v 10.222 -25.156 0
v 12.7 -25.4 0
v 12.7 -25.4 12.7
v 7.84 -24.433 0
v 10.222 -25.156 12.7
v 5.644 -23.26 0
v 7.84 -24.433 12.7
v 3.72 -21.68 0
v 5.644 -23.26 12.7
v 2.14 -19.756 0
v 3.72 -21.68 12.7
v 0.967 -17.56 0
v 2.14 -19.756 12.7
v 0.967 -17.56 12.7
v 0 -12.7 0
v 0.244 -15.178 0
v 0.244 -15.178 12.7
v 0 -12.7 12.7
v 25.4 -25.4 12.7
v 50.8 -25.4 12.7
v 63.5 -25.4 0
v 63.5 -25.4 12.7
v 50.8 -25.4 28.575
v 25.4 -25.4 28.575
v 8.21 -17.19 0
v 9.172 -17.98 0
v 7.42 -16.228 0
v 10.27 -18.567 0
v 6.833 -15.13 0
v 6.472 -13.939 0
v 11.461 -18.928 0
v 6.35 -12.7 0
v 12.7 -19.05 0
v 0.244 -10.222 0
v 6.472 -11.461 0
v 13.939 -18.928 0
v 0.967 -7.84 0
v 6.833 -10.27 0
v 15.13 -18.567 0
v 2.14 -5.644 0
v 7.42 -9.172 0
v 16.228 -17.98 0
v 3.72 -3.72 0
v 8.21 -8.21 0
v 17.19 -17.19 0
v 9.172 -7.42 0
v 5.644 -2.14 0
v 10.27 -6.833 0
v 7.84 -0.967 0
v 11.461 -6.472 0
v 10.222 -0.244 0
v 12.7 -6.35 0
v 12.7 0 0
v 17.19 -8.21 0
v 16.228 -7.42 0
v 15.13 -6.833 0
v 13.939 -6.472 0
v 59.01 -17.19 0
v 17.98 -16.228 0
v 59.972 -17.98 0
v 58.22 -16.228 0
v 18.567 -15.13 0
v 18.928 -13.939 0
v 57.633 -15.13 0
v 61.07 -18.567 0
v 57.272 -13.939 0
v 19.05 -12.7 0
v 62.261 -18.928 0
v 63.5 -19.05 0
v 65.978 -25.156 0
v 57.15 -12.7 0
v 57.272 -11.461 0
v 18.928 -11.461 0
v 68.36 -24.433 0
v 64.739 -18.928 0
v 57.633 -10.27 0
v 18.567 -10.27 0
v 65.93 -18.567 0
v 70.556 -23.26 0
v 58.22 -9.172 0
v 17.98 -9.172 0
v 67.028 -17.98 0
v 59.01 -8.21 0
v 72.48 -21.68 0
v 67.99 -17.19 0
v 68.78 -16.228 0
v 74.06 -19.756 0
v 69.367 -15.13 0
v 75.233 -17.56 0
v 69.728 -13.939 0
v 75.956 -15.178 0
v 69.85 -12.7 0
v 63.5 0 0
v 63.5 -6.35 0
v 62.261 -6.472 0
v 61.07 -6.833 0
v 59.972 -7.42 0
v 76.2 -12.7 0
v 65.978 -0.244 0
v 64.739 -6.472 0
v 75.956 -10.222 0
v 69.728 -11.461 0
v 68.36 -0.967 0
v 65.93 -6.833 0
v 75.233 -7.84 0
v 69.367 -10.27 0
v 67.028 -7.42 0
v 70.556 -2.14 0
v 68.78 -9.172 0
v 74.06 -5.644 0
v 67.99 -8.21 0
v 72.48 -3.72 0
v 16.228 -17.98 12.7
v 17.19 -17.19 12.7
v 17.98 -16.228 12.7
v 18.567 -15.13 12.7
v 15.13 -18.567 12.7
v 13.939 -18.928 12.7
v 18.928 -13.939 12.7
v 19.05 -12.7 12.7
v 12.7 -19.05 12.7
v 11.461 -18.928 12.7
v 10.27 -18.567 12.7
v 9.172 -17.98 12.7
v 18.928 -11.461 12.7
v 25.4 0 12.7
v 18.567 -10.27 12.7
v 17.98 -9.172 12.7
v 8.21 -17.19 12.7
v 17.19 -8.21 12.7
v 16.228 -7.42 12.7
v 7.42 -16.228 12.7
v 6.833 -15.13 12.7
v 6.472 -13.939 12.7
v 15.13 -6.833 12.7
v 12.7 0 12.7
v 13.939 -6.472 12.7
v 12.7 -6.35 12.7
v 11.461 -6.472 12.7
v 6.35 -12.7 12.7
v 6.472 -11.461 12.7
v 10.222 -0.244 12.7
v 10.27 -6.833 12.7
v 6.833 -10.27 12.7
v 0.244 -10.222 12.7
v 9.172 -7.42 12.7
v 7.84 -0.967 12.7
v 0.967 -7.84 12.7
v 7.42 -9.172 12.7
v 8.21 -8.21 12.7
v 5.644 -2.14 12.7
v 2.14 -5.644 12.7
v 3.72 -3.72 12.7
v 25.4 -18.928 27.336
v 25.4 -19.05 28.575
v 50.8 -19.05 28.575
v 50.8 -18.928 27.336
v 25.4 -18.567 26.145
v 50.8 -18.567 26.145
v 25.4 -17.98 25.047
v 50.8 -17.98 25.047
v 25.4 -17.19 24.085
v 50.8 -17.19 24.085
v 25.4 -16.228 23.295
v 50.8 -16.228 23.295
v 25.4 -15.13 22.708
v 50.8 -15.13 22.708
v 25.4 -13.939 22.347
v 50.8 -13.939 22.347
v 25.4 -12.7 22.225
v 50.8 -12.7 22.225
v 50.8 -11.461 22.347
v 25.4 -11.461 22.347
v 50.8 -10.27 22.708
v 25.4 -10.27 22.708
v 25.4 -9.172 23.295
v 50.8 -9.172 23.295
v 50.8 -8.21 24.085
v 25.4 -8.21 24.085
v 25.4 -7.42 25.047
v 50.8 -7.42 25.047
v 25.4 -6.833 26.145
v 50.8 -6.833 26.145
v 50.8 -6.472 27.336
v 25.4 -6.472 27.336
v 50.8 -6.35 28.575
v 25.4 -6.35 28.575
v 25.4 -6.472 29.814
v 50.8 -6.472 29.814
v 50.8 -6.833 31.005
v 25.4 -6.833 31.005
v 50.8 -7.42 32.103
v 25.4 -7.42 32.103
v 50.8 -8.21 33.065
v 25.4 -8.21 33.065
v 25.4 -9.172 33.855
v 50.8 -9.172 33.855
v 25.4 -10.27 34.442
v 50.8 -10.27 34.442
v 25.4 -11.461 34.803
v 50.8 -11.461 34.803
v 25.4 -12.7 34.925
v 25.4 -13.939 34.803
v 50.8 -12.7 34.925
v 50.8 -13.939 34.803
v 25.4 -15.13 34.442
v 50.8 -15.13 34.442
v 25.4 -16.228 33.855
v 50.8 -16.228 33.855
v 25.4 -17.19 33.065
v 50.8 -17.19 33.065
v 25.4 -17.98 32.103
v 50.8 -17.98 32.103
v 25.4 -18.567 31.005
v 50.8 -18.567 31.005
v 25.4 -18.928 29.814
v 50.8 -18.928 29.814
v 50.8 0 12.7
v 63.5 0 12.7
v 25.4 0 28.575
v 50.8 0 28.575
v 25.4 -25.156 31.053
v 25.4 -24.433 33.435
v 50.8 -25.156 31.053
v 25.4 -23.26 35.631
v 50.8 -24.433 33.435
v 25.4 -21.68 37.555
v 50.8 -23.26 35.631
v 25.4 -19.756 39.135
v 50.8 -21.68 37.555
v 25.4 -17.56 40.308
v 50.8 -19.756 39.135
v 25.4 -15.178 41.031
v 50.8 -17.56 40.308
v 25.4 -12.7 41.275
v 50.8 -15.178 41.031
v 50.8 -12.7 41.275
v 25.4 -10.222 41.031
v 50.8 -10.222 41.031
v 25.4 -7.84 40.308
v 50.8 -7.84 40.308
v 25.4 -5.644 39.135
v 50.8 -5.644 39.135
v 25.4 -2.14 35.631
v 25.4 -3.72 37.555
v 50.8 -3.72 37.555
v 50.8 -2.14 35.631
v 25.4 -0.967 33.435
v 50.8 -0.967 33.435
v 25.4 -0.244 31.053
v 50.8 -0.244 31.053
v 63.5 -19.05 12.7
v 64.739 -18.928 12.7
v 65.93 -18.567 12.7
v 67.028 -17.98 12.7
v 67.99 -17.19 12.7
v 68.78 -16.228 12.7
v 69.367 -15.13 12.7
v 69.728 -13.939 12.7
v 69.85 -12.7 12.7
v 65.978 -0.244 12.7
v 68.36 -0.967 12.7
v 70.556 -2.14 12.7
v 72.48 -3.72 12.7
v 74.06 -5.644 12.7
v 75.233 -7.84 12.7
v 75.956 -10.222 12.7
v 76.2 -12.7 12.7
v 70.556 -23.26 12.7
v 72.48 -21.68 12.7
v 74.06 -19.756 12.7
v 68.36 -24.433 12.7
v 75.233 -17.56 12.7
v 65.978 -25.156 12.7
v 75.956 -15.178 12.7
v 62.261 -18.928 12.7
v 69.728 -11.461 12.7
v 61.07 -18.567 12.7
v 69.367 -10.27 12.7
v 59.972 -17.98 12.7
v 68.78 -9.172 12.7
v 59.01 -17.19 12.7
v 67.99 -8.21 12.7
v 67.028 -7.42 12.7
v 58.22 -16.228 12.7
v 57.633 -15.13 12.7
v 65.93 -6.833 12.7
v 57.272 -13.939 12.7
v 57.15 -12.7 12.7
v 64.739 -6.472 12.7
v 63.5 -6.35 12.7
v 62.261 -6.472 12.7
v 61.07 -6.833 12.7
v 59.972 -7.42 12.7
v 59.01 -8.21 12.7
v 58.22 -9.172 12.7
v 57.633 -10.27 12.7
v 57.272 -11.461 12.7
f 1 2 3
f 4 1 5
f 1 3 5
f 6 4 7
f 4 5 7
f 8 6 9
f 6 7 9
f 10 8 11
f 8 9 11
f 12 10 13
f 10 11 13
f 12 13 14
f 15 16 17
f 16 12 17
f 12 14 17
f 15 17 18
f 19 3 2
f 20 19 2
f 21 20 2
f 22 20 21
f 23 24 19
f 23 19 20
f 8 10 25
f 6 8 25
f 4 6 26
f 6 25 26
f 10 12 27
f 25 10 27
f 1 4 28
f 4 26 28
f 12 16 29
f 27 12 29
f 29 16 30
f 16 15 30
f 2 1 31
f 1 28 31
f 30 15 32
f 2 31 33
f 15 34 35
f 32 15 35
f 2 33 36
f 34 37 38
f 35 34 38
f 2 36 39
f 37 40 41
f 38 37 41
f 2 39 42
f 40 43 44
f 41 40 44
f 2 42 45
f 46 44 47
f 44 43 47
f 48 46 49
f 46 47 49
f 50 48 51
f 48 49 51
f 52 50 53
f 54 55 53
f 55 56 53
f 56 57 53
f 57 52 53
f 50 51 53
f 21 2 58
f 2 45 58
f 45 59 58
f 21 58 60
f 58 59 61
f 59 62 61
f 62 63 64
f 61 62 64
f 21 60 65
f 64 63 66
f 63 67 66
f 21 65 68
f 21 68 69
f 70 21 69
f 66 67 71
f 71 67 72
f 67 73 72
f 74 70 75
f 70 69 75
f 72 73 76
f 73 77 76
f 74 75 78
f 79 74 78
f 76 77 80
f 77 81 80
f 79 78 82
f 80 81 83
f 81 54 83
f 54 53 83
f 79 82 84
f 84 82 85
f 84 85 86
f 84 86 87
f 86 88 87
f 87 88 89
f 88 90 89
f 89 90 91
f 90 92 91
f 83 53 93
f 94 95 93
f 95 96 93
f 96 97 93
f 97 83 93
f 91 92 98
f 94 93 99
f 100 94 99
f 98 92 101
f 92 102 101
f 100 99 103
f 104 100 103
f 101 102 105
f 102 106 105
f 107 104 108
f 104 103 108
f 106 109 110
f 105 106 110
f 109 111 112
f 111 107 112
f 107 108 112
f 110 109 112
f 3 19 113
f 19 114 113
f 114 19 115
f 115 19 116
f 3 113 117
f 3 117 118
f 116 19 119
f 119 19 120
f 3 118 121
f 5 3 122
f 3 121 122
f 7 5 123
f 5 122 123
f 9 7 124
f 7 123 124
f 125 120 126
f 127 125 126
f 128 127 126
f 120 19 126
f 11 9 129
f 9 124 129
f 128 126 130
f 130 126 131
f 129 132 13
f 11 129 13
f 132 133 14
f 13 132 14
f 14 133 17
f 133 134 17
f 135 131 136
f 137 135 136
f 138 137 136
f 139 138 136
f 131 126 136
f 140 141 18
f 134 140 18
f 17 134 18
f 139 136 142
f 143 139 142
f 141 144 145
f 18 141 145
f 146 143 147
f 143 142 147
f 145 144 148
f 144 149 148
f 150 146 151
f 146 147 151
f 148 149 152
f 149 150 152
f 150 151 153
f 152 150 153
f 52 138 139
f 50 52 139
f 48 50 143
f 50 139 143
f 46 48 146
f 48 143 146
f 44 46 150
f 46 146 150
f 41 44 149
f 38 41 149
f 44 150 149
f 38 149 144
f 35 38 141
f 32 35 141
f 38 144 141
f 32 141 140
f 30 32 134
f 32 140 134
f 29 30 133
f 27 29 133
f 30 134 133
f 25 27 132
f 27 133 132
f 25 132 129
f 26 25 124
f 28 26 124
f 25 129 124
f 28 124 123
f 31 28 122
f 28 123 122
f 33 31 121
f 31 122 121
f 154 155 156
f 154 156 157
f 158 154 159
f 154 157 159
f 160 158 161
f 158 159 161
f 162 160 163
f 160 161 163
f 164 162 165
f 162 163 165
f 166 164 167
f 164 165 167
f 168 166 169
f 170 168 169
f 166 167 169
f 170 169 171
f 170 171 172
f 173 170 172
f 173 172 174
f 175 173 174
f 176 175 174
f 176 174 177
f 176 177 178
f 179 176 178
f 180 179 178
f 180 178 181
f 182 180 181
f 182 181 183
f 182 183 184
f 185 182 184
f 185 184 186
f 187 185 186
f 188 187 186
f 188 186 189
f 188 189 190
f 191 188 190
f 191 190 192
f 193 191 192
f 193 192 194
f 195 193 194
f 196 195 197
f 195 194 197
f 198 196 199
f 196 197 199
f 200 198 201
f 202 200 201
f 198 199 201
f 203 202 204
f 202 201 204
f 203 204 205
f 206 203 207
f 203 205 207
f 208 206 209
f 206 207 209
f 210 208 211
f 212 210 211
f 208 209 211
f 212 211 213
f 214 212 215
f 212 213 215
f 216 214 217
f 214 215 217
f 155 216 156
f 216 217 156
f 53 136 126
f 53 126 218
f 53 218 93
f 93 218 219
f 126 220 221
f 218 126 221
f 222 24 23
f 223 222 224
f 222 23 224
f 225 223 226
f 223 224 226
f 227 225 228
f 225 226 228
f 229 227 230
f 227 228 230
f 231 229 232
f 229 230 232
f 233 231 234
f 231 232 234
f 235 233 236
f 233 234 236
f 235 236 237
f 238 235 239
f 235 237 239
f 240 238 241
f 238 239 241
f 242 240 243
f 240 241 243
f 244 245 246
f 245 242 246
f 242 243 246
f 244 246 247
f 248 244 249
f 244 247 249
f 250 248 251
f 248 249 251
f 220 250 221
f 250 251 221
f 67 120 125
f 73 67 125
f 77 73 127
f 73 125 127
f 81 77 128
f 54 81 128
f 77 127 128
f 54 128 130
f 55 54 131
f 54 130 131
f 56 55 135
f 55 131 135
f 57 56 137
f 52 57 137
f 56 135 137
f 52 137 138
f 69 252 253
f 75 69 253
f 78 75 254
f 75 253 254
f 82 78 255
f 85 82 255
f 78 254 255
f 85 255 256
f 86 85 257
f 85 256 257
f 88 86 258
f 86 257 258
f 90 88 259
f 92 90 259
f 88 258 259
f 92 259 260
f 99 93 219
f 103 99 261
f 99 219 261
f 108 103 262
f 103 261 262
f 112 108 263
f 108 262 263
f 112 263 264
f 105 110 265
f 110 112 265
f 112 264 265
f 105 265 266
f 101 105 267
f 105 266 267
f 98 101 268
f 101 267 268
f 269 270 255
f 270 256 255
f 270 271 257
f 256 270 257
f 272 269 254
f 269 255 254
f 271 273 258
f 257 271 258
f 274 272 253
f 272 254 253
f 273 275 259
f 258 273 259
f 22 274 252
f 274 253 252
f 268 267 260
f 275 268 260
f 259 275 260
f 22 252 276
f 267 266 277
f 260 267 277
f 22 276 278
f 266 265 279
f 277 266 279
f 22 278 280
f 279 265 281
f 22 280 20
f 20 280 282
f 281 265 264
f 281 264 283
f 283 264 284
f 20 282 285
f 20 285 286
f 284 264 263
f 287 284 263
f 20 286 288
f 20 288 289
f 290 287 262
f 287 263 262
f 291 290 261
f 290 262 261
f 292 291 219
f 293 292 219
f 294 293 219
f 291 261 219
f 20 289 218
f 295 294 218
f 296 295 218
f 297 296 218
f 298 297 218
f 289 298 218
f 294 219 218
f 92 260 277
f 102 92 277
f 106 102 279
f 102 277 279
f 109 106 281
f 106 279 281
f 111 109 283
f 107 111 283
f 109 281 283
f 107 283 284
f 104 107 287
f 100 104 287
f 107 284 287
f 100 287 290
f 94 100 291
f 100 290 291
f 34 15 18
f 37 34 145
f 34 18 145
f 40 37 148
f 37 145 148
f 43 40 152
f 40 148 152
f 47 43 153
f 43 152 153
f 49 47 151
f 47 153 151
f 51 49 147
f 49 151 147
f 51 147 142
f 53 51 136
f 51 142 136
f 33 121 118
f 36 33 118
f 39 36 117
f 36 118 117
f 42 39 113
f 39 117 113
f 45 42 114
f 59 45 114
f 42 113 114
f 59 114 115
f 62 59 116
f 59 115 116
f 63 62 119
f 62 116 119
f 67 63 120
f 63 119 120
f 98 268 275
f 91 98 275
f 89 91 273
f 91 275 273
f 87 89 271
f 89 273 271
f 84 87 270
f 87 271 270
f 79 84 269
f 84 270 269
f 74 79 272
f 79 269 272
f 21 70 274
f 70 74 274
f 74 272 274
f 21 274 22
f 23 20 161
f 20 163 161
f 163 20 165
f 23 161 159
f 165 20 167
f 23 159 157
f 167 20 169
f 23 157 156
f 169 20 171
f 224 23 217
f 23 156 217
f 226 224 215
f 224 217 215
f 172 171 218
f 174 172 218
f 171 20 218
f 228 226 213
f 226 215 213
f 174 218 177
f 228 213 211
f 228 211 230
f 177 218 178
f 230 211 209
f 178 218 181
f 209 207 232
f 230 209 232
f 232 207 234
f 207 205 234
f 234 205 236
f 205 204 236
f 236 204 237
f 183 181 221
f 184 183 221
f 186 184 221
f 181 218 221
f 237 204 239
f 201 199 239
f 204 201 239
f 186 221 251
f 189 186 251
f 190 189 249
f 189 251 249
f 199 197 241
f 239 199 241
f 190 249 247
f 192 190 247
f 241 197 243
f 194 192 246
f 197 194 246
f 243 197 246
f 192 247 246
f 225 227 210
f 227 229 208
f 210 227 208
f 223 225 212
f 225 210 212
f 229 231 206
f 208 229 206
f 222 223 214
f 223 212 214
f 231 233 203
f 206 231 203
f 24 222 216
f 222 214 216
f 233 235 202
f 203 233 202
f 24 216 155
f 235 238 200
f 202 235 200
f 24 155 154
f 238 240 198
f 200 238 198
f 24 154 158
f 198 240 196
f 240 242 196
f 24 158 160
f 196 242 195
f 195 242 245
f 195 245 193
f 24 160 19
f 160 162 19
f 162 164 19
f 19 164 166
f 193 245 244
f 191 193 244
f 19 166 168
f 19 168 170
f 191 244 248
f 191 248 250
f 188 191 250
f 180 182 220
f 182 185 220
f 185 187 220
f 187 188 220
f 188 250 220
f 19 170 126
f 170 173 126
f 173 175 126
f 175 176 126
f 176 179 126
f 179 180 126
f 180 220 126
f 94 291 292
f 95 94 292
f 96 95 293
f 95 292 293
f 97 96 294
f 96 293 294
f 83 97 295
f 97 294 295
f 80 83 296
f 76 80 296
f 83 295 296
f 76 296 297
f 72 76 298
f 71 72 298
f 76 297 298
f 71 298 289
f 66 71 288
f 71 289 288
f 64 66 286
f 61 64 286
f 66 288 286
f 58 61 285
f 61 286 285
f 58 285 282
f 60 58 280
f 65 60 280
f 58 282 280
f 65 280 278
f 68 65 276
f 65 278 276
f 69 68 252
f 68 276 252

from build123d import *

# Parameters (mm, degrees)
F1_DEPTH = 25.4
F3_DEPTH = 50.801
F5_DEPTH = 12.701
F7_DEPTH = 25.4


with BuildPart() as f1:
    # F0 (on Front) → F1 (new body)
    with BuildSketch(Plane.XZ):
        Polygon((0, 12.7), (0, 0), (76.2, 0), (76.2, 12.7), (50.8, 12.7), (50.8, 44.45), (25.4, 44.45), (25.4, 12.7), align=None)
    extrude(amount=F1_DEPTH)

    # F2 (on face) → F3 (cut, through all)
    with BuildSketch(Plane.YZ.offset(50.8)):
        with BuildLine():
            Line((-19.05, 28.575), (-6.35, 28.575))
            ThreePointArc((-6.35, 28.575), (-12.7, 34.925), (-19.05, 28.575))
        make_face()
        with BuildLine():
            ThreePointArc((-19.05, 28.575), (-12.7, 22.225), (-6.35, 28.575))
            Line((-6.35, 28.575), (-19.05, 28.575))
        make_face()
        with BuildLine():
            ThreePointArc((-25.4, 28.575), (-12.7, 41.275), (0, 28.575))
            Line((0, 28.575), (0, 44.45))
            Line((0, 44.45), (-25.4, 44.45))
            Line((-25.4, 44.45), (-25.4, 28.575))
        make_face()
    extrude(amount=-F3_DEPTH, mode=Mode.SUBTRACT)

    # F4 (on face) → F5 (cut, through all)
    with BuildSketch(Plane.XY.offset(12.7)):
        with BuildLine():
            ThreePointArc((12.7, -6.35), (6.35, -12.7), (12.7, -19.05))
            Line((12.7, -19.05), (12.7, -6.35))
        make_face()
        with BuildLine():
            Line((12.7, -6.35), (12.7, -19.05))
            ThreePointArc((12.7, -19.05), (17.1901280605, -17.1901280605), (19.05, -12.7))
            ThreePointArc((19.05, -12.7), (17.1901280605, -8.2098719395), (12.7, -6.35))
        make_face()
        with BuildLine():
            Line((0, 0), (0, -12.7))
            ThreePointArc((0, -12.7), (3.7197438789, -3.7197438789), (12.7, 0))
            Line((12.7, 0), (0, 0))
        make_face()
        with BuildLine():
            Line((0, -25.4), (12.7, -25.4))
            ThreePointArc((12.7, -25.4), (3.7197438789, -21.6802561211), (0, -12.7))
            Line((0, -12.7), (0, -25.4))
        make_face()
    extrude(amount=-F5_DEPTH, mode=Mode.SUBTRACT)

    # F6 (on face) → F7 (cut)
    with BuildSketch(Plane.XY.offset(12.7)):
        with BuildLine():
            Line((63.5, -19.05), (63.5, -6.35))
            ThreePointArc((63.5, -6.35), (57.15, -12.7), (63.5, -19.05))
        make_face()
        with BuildLine():
            ThreePointArc((69.85, -12.7), (67.9901280605, -8.2098719395), (63.5, -6.35))
            Line((63.5, -6.35), (63.5, -19.05))
            ThreePointArc((63.5, -19.05), (67.9901280605, -17.1901280605), (69.85, -12.7))
        make_face()
        with BuildLine():
            Line((76.2, 0), (63.5, 0))
            ThreePointArc((63.5, 0), (72.4802561211, -3.7197438789), (76.2, -12.7))
            Line((76.2, -12.7), (76.2, 0))
        make_face()
        with BuildLine():
            Line((76.2, -25.4), (76.2, -12.7))
            ThreePointArc((76.2, -12.7), (72.4802561211, -21.6802561211), (63.5, -25.4))
            Line((63.5, -25.4), (76.2, -25.4))
        make_face()
    extrude(amount=-F7_DEPTH, mode=Mode.SUBTRACT)


solid = f1.part
